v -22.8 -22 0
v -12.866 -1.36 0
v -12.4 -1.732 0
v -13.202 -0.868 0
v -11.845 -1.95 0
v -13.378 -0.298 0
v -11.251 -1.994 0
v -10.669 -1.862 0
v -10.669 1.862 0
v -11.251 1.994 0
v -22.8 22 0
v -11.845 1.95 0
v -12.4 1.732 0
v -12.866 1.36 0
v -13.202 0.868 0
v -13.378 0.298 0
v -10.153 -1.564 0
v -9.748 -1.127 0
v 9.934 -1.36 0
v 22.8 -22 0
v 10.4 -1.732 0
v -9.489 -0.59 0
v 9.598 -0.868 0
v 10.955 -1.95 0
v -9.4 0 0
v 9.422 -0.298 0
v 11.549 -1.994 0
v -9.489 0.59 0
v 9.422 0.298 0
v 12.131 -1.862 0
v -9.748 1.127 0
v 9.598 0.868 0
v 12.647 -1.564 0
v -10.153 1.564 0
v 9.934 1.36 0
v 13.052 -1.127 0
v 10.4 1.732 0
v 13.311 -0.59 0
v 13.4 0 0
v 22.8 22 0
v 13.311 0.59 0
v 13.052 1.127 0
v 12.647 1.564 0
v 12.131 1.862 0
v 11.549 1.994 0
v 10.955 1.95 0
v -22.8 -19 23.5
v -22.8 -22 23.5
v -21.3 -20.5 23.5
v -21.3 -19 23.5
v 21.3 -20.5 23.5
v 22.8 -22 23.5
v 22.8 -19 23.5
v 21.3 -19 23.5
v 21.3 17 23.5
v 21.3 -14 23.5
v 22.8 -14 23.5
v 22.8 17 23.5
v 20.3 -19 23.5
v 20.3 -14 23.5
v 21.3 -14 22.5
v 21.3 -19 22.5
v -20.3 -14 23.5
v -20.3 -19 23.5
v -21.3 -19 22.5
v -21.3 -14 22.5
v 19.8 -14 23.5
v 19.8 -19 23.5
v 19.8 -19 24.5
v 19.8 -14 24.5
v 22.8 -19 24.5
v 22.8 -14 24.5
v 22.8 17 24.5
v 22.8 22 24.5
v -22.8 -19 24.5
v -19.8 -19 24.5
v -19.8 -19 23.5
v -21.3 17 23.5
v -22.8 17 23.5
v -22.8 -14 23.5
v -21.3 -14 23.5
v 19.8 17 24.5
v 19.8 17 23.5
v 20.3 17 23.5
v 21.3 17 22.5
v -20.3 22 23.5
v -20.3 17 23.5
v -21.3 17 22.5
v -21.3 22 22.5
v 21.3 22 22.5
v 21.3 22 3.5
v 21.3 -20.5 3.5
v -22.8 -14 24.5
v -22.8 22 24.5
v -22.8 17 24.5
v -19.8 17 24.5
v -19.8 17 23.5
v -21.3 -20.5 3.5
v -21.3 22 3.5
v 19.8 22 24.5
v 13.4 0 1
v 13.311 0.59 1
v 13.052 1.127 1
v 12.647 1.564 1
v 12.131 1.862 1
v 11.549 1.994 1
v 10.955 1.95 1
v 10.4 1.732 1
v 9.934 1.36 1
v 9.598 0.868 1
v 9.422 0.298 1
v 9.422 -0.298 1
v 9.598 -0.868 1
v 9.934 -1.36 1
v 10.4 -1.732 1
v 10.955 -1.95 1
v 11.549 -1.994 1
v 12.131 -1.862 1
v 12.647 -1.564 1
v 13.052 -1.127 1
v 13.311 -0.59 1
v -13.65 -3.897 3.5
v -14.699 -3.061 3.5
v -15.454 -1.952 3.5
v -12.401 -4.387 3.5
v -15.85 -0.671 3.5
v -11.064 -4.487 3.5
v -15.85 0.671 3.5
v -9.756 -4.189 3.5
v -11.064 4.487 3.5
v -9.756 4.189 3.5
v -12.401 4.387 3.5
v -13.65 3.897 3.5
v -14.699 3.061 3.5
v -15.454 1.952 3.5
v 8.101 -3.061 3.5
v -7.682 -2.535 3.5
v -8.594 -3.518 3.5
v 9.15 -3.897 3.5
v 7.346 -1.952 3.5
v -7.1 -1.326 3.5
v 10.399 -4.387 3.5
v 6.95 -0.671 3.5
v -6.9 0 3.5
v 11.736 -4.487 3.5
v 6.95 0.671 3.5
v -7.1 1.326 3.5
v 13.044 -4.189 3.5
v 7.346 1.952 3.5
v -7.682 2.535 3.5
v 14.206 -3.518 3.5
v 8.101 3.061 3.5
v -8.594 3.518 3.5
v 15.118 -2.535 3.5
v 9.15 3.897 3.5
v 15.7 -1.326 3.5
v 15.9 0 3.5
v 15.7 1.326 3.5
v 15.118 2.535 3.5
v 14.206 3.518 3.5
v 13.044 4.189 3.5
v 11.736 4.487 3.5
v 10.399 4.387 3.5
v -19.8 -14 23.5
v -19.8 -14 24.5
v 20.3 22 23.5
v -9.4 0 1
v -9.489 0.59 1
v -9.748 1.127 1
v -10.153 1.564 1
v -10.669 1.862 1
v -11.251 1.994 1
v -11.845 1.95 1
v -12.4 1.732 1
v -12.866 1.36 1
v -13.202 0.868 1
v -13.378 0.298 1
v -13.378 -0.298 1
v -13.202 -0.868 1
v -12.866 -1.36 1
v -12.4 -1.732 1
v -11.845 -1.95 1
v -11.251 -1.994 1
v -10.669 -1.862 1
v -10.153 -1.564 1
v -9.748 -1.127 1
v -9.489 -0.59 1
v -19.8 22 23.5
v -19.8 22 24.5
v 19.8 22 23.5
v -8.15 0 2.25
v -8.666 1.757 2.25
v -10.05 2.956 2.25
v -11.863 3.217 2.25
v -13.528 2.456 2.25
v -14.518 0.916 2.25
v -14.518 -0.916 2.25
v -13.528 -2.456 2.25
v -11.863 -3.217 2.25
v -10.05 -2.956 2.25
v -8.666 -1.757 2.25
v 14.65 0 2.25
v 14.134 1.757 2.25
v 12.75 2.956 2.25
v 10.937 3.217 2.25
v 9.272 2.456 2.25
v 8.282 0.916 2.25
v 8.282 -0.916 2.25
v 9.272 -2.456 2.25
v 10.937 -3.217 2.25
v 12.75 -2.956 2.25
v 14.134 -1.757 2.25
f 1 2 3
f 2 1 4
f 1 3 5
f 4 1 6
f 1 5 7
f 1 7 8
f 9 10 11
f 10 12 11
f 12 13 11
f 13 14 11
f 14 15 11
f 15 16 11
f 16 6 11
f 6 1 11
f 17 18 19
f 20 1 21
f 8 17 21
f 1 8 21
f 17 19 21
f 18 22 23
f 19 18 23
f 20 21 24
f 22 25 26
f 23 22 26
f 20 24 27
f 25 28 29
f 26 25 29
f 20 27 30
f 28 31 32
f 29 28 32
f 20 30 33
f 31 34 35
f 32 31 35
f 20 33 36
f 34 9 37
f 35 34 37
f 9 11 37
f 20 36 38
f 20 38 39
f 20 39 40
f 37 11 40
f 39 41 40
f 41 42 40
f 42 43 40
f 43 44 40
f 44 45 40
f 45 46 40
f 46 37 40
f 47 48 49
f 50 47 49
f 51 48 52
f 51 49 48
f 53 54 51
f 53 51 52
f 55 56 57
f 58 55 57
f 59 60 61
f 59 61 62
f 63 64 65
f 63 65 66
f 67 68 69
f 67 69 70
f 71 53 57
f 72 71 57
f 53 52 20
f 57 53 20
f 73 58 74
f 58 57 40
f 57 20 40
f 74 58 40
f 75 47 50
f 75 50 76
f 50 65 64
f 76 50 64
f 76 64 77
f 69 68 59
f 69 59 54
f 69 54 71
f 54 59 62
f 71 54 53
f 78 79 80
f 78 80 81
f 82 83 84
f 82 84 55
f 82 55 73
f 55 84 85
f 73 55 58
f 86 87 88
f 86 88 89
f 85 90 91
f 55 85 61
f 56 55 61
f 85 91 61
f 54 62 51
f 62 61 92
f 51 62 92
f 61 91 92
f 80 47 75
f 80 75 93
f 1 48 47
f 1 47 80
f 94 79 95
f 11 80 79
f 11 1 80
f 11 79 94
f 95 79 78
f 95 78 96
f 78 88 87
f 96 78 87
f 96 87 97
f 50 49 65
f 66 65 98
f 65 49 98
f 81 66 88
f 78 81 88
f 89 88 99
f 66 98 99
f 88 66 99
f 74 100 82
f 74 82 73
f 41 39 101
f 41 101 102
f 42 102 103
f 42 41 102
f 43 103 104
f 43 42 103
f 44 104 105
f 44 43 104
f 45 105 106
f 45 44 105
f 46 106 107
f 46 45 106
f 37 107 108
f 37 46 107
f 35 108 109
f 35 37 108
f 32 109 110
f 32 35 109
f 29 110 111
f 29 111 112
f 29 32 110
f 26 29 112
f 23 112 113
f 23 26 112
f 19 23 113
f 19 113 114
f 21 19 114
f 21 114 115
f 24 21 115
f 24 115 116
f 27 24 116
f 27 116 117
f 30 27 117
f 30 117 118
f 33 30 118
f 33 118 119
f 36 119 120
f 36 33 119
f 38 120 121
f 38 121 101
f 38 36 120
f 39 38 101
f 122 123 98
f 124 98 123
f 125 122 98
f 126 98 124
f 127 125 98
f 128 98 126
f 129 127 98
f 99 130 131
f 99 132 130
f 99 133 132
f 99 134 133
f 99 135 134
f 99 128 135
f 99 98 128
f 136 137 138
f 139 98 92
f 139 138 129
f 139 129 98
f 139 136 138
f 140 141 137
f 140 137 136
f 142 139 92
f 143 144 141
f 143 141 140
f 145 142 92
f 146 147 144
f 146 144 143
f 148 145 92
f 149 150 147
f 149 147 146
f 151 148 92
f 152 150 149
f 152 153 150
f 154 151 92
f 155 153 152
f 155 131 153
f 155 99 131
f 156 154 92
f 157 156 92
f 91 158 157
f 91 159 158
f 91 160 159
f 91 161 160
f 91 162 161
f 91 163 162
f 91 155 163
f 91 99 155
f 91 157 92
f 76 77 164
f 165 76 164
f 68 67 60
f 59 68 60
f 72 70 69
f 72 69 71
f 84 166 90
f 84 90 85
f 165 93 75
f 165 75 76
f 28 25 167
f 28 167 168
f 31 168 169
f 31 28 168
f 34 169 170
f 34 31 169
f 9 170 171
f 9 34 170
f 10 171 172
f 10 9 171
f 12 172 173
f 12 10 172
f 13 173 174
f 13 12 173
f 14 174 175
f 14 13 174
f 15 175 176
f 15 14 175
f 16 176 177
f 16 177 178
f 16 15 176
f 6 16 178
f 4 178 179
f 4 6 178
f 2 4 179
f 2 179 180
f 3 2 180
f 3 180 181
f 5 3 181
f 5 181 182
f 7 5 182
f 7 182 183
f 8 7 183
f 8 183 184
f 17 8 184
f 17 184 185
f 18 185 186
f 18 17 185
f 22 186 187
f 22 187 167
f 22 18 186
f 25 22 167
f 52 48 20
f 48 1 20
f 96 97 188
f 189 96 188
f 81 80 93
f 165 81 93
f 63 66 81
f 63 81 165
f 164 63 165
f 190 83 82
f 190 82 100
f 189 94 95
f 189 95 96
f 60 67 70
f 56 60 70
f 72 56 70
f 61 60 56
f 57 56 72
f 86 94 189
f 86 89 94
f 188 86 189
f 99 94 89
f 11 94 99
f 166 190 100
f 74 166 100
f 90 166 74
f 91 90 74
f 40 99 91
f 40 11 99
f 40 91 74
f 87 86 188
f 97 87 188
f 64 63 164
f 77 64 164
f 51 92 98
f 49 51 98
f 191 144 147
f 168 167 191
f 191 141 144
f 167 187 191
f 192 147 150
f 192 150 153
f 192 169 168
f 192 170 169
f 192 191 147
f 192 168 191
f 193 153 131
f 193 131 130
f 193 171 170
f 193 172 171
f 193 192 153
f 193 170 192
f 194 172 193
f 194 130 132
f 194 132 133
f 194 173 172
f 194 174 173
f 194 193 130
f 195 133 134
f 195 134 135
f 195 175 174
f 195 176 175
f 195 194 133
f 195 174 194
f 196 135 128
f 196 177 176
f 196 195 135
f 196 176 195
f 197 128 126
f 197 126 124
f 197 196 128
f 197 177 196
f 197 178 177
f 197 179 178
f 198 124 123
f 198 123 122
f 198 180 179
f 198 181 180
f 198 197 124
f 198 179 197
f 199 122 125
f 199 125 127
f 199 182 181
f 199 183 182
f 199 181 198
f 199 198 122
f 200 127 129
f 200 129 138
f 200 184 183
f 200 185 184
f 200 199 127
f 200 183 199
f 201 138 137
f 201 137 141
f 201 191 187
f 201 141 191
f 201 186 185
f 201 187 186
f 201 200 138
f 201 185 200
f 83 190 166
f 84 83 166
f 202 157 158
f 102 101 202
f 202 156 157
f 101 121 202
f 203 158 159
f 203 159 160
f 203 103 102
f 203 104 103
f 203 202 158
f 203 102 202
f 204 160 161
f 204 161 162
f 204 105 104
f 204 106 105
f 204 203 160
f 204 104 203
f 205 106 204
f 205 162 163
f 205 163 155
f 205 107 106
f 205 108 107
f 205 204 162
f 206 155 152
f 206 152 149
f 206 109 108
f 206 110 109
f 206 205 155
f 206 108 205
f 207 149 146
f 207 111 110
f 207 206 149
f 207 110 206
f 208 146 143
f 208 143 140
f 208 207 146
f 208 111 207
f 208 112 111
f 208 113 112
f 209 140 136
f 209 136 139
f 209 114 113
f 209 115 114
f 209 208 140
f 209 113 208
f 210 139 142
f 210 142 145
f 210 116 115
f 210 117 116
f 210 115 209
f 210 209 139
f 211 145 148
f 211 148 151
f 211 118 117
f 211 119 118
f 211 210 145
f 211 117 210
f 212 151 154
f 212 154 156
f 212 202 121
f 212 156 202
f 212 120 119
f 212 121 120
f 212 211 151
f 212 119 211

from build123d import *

# Parameters (mm, degrees)
SKETCH_W         = 45.6
SKETCH_H         = 44
SKETCH_R         = 2
PAD_DEPTH        = 3.5
PAD001_DEPTH     = 20
SKETCH002_W      = 3
SKETCH002_H      = 5
PAD002_DEPTH     = 1
CHAMFER_SIZE     = 1
CHAMFER001_ANGLE = 45
CHAMFER001_SIZE  = 2.5


with BuildPart() as part:
    # Sketch → Pad (new body)
    with BuildSketch(Plane.XY):
        Rectangle(SKETCH_W, SKETCH_H)
        with Locations((-11.4, 0)):
            Circle(SKETCH_R, mode=Mode.SUBTRACT)
        with Locations((11.4, 0)):
            Circle(SKETCH_R, mode=Mode.SUBTRACT)
    extrude(amount=PAD_DEPTH)

    # Sketch001 (on Face8 of Pad) → Pad001 (join)
    with BuildSketch(Plane.XY.offset(3.5)):
        Polygon((-22.8, 22), (-22.8, -22), (22.8, -22), (22.8, 22), (21.3, 22), (21.3, -20.5), (-21.3, -20.5), (-21.3, 22), align=None)
    extrude(amount=PAD001_DEPTH)

    # Sketch002 (on Face14 of Pad001) → Pad002 (join)
    with BuildSketch(Plane.XY.offset(23.5)):
        with Locations((-21.3, 19.5)):
            Rectangle(SKETCH002_W, SKETCH002_H)
        with Locations((21.3, 19.5)):
            Rectangle(SKETCH002_W, SKETCH002_H)
        with Locations((-21.3, -16.5)):
            Rectangle(SKETCH002_W, SKETCH002_H)
        with Locations((21.3, -16.5)):
            Rectangle(SKETCH002_W, SKETCH002_H)
    extrude(amount=PAD002_DEPTH)

    # Chamfer
    chamfer_edges = [part.edges().sort_by_distance(p)[0] for p in [
        (-21.3, -16.5, 23.5),
        (-21.3, 19.5, 23.5),
        (21.3, -16.5, 23.5),
        (21.3, 19.5, 23.5),
    ]]
    chamfer(chamfer_edges, length=CHAMFER_SIZE)

    # Chamfer001
    chamfer001_edges = [part.edges().sort_by_distance(p)[0] for p in [
        (9.4, 0, 3.5),
        (-13.4, 0, 3.5),
    ]]
    chamfer001_side = part.faces().sort_by_distance((0, 0.760558, 3.5))[0]
    chamfer(chamfer001_edges, length=CHAMFER001_SIZE, angle=CHAMFER001_ANGLE, reference=chamfer001_side)


solid = part.part
